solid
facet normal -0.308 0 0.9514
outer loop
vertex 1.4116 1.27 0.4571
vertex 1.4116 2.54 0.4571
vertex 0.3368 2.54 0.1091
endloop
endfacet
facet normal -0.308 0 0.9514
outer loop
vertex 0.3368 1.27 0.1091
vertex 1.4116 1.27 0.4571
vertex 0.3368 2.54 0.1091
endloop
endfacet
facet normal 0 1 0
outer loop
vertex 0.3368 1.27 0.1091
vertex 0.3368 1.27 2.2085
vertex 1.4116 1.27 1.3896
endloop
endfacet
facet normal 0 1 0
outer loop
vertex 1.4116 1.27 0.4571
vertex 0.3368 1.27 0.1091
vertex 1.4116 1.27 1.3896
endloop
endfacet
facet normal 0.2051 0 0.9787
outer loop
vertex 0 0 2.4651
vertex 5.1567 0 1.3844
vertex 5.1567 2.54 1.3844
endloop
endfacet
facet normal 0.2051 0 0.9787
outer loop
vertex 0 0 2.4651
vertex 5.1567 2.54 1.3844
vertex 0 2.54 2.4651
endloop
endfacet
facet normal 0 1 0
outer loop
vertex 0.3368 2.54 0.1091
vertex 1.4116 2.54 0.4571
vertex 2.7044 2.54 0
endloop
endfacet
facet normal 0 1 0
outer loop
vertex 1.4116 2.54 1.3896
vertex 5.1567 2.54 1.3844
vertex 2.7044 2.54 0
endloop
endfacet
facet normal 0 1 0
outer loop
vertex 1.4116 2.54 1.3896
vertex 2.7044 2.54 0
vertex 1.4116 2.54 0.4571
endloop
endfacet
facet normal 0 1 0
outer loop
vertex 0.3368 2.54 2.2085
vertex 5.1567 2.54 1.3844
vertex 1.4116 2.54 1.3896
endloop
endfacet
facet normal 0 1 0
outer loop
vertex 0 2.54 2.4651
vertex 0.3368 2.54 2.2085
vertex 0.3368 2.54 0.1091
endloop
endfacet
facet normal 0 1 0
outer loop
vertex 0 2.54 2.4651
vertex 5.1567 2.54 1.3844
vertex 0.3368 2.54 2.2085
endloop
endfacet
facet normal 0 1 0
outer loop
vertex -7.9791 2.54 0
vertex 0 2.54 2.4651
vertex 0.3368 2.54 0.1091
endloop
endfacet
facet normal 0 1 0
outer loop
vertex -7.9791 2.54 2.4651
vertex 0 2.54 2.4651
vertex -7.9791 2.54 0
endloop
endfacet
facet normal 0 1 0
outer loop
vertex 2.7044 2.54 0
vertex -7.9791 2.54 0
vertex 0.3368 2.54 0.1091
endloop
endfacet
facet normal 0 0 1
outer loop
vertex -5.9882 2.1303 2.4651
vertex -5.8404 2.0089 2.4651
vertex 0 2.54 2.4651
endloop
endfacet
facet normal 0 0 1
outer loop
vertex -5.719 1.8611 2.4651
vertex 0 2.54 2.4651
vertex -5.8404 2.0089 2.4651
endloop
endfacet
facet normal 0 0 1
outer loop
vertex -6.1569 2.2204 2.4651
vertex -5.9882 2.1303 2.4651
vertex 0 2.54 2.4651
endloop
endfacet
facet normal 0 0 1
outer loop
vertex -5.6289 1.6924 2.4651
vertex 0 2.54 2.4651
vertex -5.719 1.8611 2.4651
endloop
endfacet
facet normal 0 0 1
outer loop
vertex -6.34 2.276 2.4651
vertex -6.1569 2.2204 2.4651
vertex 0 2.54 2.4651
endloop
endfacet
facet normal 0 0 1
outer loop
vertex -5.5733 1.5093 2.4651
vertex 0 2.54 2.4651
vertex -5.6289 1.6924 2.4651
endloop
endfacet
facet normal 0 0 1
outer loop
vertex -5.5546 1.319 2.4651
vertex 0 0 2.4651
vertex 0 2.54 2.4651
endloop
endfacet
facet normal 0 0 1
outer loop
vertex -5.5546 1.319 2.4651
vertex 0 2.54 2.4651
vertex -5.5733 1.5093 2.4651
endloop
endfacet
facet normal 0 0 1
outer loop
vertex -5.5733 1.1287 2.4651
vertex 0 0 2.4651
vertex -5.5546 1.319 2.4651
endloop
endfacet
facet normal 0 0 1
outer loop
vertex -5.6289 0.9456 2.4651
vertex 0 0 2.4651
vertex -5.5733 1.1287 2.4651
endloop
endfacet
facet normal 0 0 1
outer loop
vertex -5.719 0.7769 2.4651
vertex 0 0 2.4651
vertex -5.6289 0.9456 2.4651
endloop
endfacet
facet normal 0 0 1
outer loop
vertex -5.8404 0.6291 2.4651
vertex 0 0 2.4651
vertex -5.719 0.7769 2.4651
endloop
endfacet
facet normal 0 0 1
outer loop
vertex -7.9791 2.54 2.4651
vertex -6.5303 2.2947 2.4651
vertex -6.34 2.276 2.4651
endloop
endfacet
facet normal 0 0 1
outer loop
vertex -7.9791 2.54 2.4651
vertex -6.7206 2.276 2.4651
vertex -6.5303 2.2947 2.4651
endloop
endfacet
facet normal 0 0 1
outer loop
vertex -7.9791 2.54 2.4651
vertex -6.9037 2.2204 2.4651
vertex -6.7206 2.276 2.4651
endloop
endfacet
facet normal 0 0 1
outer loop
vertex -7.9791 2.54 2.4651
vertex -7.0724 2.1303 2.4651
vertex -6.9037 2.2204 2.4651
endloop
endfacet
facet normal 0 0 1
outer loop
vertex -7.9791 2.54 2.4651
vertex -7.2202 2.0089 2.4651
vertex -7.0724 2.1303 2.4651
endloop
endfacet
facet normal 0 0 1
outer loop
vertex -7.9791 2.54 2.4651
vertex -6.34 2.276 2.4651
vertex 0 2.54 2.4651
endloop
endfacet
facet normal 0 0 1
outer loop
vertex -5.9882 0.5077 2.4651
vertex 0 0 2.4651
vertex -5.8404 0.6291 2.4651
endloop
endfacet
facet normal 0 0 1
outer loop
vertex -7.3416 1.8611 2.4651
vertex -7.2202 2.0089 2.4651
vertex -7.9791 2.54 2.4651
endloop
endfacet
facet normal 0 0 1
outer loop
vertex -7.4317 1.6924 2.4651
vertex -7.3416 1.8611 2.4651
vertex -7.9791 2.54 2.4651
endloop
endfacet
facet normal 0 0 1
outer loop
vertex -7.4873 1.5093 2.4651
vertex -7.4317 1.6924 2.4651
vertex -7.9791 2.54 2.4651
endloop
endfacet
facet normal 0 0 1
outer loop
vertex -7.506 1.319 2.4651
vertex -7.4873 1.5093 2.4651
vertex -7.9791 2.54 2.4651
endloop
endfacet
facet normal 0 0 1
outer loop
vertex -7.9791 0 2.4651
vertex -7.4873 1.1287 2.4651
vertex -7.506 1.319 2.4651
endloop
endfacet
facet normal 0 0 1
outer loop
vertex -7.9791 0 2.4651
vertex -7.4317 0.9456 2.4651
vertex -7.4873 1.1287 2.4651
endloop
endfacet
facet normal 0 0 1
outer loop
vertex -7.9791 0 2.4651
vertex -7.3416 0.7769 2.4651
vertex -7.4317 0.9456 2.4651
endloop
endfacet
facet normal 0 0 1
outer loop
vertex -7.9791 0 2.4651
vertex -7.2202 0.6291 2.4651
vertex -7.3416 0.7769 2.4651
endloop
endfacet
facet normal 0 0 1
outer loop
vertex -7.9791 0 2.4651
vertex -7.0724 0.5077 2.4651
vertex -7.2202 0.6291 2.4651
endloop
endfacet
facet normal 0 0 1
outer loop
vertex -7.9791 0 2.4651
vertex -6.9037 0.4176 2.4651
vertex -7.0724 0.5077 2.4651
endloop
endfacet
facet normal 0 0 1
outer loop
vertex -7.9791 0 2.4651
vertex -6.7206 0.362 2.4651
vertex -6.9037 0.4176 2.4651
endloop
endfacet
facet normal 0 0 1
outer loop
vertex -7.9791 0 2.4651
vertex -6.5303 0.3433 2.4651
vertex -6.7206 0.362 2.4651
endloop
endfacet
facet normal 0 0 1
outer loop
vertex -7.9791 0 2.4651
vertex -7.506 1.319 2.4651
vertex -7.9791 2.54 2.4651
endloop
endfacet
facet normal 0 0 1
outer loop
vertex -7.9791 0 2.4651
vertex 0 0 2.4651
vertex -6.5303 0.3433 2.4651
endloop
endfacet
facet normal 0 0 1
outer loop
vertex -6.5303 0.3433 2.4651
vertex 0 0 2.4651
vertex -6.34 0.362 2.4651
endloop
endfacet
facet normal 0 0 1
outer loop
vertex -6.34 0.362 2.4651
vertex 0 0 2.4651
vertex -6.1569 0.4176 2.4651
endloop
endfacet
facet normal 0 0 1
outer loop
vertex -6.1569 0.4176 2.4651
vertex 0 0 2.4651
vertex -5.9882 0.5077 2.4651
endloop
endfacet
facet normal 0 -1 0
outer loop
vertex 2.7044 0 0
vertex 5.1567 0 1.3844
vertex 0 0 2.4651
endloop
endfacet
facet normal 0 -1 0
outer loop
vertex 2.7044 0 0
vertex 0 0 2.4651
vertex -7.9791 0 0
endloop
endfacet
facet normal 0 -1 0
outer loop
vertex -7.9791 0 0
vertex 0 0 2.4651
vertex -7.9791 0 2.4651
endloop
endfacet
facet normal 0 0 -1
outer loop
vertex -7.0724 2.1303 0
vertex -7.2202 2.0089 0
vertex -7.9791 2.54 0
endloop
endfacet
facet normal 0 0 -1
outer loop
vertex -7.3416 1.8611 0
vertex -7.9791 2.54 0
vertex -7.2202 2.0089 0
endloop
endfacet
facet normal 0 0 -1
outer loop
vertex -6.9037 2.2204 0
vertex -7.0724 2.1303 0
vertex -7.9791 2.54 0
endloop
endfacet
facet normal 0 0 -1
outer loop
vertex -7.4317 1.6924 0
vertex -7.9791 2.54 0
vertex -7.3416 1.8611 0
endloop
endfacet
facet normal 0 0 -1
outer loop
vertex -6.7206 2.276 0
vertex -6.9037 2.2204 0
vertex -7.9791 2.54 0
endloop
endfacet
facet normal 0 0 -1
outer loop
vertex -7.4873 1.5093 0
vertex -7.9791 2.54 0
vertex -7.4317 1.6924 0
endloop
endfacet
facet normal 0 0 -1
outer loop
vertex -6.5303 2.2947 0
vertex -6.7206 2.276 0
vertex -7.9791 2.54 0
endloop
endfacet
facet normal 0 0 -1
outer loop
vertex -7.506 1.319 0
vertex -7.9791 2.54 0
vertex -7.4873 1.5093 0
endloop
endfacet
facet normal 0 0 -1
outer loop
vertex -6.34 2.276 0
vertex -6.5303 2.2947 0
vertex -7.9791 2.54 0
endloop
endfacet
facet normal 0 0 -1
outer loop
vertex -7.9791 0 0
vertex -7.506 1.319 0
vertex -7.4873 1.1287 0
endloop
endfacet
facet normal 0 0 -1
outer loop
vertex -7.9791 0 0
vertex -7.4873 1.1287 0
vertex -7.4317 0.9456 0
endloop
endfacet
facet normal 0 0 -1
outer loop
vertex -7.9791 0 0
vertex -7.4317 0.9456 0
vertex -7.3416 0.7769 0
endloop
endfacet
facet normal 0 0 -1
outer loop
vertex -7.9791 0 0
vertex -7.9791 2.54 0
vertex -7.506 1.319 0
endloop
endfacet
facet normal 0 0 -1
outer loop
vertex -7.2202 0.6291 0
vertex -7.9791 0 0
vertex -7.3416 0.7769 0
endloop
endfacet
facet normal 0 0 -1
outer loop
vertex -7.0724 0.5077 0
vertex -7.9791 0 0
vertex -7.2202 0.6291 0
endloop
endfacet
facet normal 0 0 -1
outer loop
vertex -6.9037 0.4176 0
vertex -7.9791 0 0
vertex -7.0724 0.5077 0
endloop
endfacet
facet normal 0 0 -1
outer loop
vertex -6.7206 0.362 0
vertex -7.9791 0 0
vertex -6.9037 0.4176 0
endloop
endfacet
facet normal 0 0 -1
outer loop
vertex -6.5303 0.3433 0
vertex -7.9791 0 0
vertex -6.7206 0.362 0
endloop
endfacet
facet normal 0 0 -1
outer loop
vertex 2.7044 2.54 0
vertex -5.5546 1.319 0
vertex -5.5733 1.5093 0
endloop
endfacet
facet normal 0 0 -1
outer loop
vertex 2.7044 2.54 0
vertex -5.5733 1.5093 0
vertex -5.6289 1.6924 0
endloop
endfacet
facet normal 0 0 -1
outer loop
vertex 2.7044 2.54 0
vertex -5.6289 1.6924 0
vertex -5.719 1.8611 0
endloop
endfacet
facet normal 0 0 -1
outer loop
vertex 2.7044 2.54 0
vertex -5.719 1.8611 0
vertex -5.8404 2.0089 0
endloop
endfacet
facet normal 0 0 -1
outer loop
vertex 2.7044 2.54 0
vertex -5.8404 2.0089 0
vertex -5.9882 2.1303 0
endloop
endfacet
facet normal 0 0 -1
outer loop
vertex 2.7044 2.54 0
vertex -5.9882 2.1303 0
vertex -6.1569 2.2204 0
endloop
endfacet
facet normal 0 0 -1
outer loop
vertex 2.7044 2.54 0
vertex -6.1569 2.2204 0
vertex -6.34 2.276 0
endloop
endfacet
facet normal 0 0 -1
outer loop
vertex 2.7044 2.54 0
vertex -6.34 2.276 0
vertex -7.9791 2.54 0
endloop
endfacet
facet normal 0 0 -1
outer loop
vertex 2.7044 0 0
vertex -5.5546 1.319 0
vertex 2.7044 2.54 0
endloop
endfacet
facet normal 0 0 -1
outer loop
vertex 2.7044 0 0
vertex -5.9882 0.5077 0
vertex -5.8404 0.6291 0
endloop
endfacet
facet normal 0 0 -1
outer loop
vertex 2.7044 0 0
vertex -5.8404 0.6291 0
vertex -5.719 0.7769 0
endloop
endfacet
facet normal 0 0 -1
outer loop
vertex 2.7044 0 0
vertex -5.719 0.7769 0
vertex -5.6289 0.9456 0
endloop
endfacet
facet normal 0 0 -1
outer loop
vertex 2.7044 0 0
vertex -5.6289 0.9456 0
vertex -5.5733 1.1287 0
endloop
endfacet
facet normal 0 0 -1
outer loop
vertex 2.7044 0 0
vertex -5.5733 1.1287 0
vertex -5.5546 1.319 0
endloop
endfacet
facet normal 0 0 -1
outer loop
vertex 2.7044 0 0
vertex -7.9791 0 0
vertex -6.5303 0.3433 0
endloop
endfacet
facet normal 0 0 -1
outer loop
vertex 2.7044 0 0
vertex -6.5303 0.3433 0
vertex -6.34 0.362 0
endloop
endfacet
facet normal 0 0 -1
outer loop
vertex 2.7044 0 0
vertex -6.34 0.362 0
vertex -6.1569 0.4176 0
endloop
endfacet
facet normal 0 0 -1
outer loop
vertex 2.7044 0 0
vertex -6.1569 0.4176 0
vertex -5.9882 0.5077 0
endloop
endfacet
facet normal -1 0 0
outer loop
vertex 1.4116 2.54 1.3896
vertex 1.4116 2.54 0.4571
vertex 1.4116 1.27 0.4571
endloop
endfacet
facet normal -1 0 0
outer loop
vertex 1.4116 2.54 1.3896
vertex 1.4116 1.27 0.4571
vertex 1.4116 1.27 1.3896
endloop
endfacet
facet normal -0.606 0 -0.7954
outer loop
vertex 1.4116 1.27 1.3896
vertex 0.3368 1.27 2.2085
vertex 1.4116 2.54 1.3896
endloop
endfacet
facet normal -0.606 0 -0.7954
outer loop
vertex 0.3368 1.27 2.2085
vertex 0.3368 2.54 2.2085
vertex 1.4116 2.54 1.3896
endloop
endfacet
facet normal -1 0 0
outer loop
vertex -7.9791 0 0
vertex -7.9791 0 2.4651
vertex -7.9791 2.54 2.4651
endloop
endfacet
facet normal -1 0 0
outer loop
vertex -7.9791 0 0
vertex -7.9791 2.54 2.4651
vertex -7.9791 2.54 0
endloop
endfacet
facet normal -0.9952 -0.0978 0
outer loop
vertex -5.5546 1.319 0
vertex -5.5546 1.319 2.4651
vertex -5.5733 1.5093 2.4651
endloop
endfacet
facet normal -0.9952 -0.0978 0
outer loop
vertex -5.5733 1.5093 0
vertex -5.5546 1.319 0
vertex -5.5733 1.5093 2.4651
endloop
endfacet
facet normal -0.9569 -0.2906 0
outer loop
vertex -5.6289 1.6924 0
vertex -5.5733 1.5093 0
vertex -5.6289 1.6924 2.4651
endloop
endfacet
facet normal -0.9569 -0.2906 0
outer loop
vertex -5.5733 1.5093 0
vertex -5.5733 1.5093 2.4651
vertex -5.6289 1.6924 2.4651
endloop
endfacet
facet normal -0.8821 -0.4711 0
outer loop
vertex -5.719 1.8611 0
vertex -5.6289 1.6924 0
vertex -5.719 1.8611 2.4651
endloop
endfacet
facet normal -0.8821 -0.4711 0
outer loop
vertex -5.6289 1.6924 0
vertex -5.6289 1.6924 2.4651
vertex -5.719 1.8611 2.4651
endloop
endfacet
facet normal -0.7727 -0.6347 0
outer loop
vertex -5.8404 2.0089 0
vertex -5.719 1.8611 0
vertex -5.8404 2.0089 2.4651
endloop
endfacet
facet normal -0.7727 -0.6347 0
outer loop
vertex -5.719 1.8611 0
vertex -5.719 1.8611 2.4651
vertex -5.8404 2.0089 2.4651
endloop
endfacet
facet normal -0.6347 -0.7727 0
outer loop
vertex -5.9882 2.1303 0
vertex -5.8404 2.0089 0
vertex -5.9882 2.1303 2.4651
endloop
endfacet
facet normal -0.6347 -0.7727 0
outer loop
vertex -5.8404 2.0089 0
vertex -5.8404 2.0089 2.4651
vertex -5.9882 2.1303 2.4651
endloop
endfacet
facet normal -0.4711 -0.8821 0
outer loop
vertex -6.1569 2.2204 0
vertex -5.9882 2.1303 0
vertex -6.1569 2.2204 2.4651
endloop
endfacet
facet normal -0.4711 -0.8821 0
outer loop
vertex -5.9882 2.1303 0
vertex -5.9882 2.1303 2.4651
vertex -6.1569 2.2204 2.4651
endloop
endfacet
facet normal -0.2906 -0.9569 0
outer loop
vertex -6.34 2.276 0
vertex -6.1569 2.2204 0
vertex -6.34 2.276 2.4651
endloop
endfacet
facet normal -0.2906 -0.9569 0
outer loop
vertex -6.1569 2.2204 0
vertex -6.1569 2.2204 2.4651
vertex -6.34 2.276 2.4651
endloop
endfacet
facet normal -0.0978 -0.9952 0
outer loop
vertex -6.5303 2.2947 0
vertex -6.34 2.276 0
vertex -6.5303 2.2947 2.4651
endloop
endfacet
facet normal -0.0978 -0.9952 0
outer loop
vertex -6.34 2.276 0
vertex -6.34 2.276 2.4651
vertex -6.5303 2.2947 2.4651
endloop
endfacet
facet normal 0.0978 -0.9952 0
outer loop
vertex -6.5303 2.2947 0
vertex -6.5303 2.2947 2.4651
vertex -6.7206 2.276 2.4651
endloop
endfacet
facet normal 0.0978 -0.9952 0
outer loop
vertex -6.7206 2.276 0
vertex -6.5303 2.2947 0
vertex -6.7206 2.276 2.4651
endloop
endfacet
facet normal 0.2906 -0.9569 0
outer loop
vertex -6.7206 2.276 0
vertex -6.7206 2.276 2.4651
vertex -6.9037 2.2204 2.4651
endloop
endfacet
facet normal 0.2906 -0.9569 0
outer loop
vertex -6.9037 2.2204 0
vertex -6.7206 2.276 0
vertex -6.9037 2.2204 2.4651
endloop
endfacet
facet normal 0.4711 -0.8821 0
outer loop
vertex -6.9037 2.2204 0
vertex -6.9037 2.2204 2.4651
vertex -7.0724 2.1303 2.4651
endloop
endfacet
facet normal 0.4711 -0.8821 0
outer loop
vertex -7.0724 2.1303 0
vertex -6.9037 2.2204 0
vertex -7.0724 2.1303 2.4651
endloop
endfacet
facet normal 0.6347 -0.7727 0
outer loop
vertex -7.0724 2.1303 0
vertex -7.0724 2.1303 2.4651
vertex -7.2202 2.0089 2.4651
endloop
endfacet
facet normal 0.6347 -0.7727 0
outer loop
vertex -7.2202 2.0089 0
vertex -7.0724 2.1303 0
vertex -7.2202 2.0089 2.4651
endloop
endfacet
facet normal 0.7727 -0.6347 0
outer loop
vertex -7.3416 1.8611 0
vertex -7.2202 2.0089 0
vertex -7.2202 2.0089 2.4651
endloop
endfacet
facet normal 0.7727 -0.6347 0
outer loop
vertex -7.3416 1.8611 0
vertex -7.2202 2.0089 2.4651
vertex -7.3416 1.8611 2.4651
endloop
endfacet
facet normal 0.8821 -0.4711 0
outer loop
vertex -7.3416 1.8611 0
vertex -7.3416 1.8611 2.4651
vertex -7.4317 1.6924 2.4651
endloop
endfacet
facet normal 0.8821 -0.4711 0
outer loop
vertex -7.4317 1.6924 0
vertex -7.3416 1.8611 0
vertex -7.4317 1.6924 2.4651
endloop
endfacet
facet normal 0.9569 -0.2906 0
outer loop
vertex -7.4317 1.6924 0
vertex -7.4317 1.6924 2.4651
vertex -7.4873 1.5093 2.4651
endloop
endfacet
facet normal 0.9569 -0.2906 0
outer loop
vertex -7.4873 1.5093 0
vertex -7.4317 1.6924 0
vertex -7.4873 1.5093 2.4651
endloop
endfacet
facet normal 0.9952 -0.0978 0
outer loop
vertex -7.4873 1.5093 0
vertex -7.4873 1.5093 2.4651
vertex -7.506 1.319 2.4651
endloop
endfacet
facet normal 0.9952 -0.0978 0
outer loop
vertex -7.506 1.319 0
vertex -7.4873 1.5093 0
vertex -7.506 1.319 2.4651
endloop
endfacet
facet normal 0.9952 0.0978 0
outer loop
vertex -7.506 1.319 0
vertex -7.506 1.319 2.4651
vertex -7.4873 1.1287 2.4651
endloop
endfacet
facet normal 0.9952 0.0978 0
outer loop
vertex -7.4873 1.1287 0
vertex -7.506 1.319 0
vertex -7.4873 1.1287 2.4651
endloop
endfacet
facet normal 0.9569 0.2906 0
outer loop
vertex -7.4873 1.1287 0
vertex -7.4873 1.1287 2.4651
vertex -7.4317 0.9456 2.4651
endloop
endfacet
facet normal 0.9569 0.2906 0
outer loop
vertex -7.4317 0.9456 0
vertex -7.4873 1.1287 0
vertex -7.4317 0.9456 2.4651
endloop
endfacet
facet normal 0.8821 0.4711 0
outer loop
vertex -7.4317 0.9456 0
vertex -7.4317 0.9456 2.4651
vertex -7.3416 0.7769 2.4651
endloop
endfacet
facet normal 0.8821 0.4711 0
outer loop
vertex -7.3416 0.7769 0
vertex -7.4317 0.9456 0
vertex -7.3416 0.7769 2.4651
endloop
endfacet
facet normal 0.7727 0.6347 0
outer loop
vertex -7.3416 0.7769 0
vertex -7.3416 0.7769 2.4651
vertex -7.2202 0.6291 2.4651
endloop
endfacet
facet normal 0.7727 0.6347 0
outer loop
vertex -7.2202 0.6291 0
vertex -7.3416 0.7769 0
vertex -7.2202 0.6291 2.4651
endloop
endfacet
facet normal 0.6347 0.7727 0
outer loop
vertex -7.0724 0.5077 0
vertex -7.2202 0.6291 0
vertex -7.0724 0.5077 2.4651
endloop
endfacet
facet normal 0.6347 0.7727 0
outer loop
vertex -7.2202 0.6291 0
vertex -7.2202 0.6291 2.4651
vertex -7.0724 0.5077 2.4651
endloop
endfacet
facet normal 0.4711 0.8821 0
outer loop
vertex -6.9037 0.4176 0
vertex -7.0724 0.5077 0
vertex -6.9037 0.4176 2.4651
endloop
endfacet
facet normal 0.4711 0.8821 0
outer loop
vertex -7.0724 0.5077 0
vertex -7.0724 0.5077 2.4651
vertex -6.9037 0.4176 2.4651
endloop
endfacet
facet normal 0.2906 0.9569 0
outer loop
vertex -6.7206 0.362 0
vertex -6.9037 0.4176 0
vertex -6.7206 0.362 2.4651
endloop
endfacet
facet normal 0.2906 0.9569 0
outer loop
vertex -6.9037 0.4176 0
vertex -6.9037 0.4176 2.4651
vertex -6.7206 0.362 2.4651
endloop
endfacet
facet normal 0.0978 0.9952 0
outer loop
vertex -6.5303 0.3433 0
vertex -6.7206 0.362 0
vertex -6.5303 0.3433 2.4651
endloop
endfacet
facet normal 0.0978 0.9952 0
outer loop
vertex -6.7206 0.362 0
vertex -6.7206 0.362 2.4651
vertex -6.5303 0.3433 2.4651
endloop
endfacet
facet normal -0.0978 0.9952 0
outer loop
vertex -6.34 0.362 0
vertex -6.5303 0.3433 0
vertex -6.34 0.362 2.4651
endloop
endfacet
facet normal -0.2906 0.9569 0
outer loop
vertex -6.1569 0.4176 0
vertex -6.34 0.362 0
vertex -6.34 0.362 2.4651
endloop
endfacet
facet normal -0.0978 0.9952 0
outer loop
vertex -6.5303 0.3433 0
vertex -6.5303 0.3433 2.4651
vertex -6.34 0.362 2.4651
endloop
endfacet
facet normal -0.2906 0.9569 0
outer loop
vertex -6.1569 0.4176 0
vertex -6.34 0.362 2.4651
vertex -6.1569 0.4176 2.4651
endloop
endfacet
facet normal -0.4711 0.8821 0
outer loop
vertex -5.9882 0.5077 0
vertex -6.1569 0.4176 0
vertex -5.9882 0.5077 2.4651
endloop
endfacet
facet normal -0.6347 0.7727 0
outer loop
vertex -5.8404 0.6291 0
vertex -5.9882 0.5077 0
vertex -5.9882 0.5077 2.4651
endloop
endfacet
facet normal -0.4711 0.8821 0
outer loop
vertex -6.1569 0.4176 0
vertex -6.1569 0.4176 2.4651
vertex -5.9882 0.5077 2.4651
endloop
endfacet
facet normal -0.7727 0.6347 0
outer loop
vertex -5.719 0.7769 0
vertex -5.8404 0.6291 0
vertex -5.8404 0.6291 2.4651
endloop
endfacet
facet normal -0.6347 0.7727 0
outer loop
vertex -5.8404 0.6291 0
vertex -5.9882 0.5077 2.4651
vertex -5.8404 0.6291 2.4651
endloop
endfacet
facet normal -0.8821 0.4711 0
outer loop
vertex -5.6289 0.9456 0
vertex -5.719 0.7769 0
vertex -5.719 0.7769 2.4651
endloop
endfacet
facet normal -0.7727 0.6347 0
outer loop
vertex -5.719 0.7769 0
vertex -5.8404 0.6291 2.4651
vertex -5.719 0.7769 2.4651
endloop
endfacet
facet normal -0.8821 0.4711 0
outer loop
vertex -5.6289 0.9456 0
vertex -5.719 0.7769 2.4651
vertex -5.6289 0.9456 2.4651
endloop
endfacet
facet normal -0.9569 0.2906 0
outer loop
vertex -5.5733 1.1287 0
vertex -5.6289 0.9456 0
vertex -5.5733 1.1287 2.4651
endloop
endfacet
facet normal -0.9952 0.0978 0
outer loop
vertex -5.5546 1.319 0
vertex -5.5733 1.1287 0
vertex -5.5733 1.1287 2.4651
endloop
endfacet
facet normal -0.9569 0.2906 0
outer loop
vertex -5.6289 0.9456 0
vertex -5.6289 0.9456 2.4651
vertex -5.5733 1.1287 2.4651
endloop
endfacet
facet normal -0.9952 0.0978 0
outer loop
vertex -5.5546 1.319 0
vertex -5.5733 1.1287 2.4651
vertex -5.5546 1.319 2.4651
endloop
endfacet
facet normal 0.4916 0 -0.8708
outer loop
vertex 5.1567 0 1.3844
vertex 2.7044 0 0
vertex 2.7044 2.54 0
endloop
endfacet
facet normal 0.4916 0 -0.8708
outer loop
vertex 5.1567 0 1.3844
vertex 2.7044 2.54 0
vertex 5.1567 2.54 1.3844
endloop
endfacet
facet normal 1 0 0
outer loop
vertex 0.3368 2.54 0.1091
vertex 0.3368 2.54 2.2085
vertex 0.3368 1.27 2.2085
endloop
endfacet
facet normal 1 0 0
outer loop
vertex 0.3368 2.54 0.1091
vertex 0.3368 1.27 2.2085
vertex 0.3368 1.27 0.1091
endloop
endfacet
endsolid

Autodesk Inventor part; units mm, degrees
ref_plane "YZ Plane" through (0, 0, 0) normal (1, 0, 0) x (0, 1, 0)
ref_plane "XZ Plane" through (0, 0, 0) normal (0, 1, 0) x (-1, 0, 0)
ref_plane "XY Plane" through (0, 0, 0) normal (0, 0, 1) x (1, 0, 0)
sketch "Sketch1" plane through (0, 0, 0) normal (0, 1, 0) x (-1, 0, 0)
  line L0 (0, 2.4651) -> (7.9791, 2.4651)
  line L1 (7.9791, 2.4651) -> (7.9791, 0)
  line L2 (0, 0) -> (-2.7044, 0)
  line L3 (-2.7044, 0) -> (-5.1567, 1.3844)
  line L4 (-5.1567, 1.3844) -> (0, 2.4651)
  line L5 (7.9791, 0) -> (-2.7044, 0)
extrude "Extrusion1" add sketch "Sketch1" along normal blind 2.54
extrude "Extrusion2" [suppressed]
sketch "Sketch2" plane through (0, 2.54, 0) normal (0, 1, 0) x (1, 0, 0)
  line L0 (0, -2.4651) -> (2.2705, -0.7352) projected
  line L1 (0.3368, -2.2085) -> (0.3368, -0.1091)
  line L2 (2.2705, -0.7352) -> (0, 0) projected
  line L3 (1.4116, -0.4571) -> (1.4116, -1.3896)
  line L4 (0.3368, -2.2085) -> (1.4116, -1.3896)
  line L5 (0.3368, -0.1091) -> (1.4116, -0.4571)
  line L6 (0.3368, -2.2085) -> (1.4116, -1.3896)
extrude "Extrusion3" cut sketch "Sketch2" against normal blind 1.27 contours L1 L2 L3 L0
sketch "Sketch3" plane through (-7.9791, 0, 2.4651) normal (0, 0, 1) x (1, 0, 0)
  circle A0 centre (1.4488, 1.319) radius 0.9757
  point P0 (7.9791, 0)
extrude "Extrusion4" cut sketch "Sketch3" against normal blind 5.08
properties part number "hook" material "Nylon 6/6"
